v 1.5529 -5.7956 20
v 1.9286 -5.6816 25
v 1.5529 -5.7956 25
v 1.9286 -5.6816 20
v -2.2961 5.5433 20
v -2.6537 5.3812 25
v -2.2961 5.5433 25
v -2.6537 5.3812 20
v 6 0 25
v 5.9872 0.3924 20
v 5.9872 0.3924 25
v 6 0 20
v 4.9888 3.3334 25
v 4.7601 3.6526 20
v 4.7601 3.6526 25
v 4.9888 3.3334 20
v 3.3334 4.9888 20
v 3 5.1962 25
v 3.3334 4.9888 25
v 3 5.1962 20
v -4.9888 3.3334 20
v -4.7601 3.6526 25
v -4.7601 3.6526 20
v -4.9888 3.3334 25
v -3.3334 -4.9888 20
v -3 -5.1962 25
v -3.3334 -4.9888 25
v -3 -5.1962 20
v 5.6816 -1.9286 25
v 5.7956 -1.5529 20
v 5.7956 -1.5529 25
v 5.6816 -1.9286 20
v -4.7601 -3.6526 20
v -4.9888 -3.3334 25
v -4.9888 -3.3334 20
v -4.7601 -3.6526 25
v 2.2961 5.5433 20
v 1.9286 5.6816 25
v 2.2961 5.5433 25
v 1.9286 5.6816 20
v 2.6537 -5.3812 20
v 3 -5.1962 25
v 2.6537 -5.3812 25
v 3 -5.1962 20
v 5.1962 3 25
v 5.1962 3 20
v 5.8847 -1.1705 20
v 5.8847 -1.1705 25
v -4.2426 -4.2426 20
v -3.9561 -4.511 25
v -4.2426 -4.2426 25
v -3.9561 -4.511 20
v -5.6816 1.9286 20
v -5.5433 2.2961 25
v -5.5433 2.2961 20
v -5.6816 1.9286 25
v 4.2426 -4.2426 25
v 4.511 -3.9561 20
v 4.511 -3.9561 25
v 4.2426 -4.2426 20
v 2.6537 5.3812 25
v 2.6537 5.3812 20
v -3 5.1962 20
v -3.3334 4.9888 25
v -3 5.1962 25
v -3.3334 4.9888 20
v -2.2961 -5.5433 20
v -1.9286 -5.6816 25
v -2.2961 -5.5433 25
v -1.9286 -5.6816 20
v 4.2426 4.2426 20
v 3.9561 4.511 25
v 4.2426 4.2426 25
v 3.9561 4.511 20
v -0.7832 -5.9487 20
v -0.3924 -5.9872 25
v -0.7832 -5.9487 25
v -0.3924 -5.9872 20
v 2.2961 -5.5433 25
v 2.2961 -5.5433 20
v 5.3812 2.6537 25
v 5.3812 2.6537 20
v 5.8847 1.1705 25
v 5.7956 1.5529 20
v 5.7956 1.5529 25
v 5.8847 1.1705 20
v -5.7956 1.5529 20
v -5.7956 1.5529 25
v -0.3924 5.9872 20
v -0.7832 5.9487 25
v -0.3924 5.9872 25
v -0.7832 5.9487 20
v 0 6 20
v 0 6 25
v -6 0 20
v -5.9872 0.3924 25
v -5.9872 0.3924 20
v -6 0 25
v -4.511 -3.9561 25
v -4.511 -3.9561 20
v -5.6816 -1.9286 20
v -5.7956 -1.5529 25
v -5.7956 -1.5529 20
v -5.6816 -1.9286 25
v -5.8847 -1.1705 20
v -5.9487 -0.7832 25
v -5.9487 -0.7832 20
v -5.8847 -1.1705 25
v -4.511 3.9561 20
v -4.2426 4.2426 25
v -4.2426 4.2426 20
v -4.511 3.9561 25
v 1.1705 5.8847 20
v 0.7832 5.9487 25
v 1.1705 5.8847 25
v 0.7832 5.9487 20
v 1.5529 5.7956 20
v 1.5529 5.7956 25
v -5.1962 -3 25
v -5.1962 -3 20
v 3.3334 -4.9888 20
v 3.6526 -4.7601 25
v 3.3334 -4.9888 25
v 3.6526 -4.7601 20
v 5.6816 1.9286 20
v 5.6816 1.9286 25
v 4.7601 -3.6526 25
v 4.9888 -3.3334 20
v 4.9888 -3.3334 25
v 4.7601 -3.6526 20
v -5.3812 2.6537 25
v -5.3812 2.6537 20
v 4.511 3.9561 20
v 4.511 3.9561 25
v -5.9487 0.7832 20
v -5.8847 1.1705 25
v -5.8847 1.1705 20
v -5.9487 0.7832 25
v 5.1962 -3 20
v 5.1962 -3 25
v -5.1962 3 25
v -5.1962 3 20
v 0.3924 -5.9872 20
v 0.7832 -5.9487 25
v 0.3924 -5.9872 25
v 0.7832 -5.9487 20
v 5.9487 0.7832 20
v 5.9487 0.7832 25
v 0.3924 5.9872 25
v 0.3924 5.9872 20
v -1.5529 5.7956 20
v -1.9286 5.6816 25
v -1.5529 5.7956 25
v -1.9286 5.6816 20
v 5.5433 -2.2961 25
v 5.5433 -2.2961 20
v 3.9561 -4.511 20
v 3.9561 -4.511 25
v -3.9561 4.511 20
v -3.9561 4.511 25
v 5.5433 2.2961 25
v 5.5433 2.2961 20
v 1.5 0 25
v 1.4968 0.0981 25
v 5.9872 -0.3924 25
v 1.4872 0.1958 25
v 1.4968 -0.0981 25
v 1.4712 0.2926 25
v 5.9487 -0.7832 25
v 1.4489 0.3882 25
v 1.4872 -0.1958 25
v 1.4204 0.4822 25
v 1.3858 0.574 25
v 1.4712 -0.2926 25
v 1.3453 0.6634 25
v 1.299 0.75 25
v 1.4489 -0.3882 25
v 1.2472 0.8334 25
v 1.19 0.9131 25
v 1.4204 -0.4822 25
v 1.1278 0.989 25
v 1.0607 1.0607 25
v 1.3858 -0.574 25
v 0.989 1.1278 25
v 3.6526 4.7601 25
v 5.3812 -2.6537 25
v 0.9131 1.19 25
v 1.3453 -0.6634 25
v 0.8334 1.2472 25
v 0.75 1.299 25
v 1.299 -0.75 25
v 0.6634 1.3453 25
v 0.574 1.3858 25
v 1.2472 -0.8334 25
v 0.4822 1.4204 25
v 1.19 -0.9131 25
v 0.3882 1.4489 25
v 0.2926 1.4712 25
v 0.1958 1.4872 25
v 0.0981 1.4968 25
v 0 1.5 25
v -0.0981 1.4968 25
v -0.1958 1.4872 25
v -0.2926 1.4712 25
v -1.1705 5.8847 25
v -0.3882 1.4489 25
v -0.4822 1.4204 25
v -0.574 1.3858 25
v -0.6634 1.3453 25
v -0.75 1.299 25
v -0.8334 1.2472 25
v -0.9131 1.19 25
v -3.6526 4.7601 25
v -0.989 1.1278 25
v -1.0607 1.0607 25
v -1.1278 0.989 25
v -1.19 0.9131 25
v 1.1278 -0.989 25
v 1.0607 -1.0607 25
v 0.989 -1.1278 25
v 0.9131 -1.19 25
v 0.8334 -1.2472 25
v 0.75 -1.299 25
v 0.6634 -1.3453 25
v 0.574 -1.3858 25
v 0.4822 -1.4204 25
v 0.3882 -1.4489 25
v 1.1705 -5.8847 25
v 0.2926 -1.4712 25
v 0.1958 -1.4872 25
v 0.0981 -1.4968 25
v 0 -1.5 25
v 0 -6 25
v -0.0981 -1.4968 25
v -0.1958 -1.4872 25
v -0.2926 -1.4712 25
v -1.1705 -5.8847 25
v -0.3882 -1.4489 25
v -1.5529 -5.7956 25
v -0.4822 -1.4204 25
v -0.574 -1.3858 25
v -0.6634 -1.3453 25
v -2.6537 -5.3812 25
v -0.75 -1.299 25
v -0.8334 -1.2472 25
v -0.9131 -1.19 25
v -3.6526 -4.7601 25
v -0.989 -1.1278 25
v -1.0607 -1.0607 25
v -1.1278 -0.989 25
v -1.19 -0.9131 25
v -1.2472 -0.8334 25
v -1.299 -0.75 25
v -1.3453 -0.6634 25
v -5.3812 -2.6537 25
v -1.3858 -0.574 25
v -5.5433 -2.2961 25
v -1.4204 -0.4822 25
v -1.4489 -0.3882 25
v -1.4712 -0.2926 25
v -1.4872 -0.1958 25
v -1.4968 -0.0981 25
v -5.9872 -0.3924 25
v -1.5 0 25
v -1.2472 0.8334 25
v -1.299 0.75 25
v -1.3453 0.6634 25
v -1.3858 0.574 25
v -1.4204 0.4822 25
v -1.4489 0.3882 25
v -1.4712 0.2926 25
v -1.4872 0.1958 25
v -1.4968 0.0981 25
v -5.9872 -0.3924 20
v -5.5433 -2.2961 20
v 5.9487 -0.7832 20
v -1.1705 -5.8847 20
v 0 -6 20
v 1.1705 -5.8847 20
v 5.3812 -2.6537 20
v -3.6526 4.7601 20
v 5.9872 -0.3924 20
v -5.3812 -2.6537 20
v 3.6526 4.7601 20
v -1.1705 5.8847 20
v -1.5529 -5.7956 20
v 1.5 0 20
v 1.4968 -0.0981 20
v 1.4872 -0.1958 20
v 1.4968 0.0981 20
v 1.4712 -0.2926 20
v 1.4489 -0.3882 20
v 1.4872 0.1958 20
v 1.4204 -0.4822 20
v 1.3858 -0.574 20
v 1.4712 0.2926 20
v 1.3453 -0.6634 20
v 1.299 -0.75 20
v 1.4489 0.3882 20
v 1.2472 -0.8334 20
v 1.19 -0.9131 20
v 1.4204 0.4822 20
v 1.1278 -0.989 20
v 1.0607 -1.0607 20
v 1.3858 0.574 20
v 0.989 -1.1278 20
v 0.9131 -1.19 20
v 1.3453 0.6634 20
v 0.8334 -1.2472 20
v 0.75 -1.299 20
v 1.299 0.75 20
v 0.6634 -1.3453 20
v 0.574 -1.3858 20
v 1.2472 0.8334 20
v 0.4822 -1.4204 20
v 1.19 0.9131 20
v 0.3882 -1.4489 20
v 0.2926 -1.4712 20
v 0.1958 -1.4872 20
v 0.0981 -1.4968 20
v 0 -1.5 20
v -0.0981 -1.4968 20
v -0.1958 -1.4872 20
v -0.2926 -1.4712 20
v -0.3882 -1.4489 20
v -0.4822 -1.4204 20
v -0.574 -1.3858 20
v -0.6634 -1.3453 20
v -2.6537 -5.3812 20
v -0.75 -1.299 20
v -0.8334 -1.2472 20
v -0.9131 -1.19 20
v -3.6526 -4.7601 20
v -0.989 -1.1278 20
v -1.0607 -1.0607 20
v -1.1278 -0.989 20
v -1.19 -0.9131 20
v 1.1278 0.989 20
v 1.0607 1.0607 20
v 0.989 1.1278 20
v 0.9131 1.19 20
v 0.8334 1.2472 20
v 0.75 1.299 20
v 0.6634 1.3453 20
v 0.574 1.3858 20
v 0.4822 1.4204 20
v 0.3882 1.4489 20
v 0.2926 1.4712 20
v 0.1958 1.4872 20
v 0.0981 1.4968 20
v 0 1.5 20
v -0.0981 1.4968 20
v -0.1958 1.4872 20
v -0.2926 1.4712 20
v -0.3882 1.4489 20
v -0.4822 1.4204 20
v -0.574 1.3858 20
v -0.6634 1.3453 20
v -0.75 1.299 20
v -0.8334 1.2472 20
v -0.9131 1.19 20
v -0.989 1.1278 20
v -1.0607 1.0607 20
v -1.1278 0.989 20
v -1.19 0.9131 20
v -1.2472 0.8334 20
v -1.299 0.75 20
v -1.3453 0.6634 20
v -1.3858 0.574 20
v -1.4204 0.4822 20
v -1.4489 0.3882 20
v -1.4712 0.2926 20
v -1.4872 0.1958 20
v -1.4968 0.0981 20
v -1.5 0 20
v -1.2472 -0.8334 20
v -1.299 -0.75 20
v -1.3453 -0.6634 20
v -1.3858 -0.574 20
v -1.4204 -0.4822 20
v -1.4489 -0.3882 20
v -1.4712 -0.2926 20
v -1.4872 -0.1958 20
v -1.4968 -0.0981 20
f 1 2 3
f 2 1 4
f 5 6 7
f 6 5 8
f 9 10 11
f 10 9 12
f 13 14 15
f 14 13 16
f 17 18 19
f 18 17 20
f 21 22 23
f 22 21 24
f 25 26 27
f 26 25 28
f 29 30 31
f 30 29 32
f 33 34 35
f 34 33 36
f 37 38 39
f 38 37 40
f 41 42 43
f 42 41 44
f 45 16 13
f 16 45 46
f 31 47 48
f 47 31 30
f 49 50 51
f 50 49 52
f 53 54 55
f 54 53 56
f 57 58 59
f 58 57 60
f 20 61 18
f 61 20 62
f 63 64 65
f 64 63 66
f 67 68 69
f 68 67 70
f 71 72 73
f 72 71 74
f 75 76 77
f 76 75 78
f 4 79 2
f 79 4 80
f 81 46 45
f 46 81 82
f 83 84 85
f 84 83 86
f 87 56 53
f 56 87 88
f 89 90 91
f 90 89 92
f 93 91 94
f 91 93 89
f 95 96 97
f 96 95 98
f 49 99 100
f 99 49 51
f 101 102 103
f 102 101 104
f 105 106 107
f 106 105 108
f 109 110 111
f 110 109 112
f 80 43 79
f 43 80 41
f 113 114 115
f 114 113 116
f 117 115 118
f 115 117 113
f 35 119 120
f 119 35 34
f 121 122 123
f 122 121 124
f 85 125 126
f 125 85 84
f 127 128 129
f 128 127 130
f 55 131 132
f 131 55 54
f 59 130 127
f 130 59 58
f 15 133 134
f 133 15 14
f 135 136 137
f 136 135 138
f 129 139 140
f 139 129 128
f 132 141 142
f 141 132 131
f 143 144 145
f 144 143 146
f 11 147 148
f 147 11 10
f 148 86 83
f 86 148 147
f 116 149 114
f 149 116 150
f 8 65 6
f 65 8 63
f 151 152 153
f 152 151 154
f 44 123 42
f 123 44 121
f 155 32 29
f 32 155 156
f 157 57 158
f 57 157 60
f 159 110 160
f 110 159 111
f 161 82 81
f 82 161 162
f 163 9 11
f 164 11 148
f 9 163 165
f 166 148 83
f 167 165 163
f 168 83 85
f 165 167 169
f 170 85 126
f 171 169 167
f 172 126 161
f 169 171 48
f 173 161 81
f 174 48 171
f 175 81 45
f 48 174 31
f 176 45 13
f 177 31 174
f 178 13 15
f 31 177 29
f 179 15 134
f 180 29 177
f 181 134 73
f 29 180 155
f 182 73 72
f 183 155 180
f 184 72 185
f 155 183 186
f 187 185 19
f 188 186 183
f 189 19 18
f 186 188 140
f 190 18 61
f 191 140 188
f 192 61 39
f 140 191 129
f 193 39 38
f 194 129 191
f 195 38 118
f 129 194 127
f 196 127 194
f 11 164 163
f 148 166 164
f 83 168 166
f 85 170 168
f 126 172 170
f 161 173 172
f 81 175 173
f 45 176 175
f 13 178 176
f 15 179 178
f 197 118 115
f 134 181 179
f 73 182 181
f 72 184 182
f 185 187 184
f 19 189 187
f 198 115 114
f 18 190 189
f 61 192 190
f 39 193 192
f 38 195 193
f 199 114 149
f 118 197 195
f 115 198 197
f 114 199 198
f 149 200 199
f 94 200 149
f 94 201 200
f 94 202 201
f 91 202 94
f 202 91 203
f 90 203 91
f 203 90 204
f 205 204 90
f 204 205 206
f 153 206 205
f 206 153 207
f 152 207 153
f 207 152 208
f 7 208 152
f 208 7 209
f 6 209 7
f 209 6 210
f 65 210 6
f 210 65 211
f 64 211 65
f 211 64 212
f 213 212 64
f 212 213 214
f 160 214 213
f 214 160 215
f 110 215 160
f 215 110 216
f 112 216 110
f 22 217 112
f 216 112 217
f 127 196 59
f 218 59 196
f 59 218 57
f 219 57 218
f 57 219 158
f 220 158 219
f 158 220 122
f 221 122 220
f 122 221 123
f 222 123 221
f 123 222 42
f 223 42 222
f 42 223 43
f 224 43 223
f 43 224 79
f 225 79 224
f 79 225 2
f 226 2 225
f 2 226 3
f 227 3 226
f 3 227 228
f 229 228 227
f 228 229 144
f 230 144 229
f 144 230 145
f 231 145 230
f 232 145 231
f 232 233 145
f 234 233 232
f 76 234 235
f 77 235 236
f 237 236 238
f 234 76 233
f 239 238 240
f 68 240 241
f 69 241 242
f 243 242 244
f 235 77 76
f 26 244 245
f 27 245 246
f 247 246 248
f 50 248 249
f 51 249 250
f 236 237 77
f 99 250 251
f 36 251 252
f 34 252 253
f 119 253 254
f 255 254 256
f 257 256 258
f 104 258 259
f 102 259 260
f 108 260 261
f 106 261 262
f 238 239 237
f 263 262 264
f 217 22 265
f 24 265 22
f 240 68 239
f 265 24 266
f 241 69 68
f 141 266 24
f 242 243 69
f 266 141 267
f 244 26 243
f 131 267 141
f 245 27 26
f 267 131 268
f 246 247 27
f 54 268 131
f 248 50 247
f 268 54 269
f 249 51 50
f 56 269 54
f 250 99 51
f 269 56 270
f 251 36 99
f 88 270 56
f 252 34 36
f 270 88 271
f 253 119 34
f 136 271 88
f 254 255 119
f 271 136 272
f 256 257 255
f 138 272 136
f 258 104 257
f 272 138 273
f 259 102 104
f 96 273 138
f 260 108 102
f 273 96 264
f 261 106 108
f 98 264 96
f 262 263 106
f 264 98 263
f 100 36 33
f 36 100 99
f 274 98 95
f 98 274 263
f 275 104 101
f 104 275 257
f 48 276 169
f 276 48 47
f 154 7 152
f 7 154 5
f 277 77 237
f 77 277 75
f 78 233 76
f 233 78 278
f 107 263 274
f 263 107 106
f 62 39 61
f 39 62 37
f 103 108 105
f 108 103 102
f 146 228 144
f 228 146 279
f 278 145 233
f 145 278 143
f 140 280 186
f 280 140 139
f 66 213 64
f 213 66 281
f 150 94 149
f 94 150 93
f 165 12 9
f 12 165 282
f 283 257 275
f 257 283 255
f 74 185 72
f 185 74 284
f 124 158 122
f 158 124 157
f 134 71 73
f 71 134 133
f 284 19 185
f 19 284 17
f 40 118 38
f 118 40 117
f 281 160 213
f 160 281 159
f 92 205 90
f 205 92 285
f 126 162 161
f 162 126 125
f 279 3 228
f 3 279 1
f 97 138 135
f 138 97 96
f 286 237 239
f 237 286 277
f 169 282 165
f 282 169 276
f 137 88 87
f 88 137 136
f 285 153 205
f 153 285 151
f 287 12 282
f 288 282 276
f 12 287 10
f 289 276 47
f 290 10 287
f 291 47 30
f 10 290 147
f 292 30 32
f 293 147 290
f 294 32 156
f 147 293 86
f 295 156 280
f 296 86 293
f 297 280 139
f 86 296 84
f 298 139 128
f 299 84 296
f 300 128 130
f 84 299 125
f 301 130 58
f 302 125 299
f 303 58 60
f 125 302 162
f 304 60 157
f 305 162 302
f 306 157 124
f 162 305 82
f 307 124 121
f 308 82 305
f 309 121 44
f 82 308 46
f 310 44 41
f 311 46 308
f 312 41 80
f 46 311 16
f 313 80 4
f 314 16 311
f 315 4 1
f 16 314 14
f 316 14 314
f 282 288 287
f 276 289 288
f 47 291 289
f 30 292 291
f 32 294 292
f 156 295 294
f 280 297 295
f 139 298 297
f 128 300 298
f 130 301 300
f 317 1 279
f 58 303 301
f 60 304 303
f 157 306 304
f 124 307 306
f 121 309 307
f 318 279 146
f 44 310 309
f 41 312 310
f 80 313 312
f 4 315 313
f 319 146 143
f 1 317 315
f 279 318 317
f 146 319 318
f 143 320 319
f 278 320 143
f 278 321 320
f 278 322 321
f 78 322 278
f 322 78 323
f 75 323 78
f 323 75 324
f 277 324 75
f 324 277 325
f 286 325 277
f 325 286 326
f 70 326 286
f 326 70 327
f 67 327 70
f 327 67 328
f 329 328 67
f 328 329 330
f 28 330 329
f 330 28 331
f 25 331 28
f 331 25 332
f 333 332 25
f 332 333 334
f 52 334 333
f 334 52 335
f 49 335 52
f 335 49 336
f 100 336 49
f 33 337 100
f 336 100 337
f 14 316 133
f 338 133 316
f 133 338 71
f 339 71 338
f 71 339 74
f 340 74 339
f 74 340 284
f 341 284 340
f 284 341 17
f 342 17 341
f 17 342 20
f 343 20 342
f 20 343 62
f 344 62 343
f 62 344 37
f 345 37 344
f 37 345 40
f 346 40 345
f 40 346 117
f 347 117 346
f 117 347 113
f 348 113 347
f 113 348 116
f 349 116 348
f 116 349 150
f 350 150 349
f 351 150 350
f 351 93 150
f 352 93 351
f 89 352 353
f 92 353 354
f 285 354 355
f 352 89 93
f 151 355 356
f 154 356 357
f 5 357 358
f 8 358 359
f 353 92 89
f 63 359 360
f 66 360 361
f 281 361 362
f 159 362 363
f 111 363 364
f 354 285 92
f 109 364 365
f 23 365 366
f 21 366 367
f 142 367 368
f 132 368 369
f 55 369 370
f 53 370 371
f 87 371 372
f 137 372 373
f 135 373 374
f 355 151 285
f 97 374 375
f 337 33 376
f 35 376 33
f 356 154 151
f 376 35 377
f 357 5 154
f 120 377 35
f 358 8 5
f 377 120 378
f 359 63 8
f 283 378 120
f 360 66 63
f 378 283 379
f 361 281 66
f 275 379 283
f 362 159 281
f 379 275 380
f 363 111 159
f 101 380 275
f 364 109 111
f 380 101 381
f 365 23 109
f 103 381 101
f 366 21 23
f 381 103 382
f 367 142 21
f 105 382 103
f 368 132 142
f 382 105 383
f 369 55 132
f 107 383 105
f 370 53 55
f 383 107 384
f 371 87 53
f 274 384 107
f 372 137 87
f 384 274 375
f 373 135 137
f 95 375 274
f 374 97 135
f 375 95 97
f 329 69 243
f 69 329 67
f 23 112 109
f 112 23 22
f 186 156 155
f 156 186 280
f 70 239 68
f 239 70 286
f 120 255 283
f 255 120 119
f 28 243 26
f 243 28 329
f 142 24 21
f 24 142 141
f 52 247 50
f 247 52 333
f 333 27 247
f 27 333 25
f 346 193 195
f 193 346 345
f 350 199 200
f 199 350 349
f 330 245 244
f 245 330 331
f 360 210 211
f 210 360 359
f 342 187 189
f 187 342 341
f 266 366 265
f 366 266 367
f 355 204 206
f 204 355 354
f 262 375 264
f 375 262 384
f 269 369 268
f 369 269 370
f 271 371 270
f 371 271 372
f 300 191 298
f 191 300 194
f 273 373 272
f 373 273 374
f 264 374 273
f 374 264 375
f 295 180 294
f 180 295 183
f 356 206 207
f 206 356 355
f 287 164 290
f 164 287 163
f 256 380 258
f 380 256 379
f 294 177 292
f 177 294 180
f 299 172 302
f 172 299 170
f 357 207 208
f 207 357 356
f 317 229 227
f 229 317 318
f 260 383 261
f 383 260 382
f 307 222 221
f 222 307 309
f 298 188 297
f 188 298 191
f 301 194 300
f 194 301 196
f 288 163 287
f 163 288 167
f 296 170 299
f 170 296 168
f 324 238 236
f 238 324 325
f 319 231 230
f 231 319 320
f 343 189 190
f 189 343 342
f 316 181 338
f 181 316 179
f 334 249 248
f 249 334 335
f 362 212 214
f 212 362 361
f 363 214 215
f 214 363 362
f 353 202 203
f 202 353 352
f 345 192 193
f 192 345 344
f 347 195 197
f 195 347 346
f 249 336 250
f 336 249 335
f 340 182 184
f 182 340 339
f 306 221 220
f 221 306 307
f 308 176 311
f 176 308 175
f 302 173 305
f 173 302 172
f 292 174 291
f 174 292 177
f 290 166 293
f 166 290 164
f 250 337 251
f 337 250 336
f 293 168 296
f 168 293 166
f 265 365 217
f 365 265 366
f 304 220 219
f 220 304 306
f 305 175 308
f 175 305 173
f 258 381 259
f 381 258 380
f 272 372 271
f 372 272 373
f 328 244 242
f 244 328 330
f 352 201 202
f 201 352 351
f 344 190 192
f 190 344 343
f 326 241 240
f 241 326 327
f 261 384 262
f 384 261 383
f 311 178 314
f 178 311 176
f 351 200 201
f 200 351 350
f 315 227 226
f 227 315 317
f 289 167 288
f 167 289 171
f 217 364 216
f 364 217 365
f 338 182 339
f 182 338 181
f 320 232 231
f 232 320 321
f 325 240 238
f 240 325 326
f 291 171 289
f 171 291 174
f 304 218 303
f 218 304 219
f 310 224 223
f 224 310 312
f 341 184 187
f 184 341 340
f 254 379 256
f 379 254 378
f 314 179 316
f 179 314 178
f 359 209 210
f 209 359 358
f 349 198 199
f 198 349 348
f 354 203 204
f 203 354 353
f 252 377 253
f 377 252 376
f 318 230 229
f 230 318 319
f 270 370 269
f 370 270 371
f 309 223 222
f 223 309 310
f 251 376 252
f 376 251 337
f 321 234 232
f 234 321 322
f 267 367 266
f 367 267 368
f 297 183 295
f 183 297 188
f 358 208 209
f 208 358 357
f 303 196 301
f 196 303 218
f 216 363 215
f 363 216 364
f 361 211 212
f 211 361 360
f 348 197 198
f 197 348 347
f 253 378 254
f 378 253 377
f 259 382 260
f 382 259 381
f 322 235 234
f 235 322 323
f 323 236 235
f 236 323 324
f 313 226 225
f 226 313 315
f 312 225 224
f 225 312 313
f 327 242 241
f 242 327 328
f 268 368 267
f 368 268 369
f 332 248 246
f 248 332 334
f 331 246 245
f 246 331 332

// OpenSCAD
// Hose-barb reducer: joins 8 mm ID tubing to 5 mm ID tubing
// Print orientation: standing upright along +Z
// Units: mm

// ---------------- Parameters ----------------
reducer_length_8mm   = 20;   // z = 0 to 20: barbs for 8 mm tubing
reducer_length_coll  = 5;    // z = 20 to 25: cylindrical collar
reducer_length_5mm   = 16;   // z = 25 to 41: barbs for 5 mm tubing

barb_height_8mm      = 10;   // each 8 mm barb height
barb_d_start_8mm     = 7.5;  // barb outer diameter at bottom
barb_d_top_8mm       = 9.5;  // barb outer diameter at top (before step back)

barb_height_5mm      = 8;    // each 5 mm barb height
barb_d_start_5mm     = 6.5;  // barb outer diameter at bottom
barb_d_top_5mm       = 5.0;  // barb outer diameter at top (before step back)

bore_d               = 3;    // through-bore diameter
eps                  = 0.5;  // overshoot for clean boolean cuts

$fn = 96;

// ---------------- Modules ----------------
module sawtooth_barb(h, d_start, d_top) {
    // Barb: diameter grows linearly, then steps straight back to start
    d_step = d_start;  // diameter after the step (same as bottom)
    linear_extrude(d_step)
        hull() {
            translate([0, 0, 0])
                cylinder(h = h, d1 = d_start, d2 = d_top);
            translate([0, 0, h])
                cylinder(h = eps, d1 = d_top, d2 = d_step);
        }
}

module through_bore(d) {
    translate([0, 0, -eps])
        cylinder(h = reducer_length_8mm + reducer_length_coll + reducer_length_5mm + 2*eps,
                 d = d);
}

// ---------------- Part ----------------
difference() {
    union() {
        // 8 mm tubing barbs (stacked)
        for (i = [0 : 1])
            translate([0, 0, i * barb_height_8mm])
                sawtooth_barb(barb_height_8mm, barb_d_start_8mm, barb_d_top_8mm);

        // Cylindrical collar
        translate([0, 0, reducer_length_8mm])
            cylinder(h = reducer_length_coll, d = 12);

        // 5 mm tubing barbs (stacked)
        z0 = reducer_length_8mm + reducer_length_coll;
        for (i = [0 : 1])
            translate([0, 0, z0 + i * barb_height_5mm])
                sawtooth_barb(barb_height_5mm, barb_d_start_5mm, barb_d_top_5mm);
    }

    // Central through-bore
    through_bore(bore_d);
}
